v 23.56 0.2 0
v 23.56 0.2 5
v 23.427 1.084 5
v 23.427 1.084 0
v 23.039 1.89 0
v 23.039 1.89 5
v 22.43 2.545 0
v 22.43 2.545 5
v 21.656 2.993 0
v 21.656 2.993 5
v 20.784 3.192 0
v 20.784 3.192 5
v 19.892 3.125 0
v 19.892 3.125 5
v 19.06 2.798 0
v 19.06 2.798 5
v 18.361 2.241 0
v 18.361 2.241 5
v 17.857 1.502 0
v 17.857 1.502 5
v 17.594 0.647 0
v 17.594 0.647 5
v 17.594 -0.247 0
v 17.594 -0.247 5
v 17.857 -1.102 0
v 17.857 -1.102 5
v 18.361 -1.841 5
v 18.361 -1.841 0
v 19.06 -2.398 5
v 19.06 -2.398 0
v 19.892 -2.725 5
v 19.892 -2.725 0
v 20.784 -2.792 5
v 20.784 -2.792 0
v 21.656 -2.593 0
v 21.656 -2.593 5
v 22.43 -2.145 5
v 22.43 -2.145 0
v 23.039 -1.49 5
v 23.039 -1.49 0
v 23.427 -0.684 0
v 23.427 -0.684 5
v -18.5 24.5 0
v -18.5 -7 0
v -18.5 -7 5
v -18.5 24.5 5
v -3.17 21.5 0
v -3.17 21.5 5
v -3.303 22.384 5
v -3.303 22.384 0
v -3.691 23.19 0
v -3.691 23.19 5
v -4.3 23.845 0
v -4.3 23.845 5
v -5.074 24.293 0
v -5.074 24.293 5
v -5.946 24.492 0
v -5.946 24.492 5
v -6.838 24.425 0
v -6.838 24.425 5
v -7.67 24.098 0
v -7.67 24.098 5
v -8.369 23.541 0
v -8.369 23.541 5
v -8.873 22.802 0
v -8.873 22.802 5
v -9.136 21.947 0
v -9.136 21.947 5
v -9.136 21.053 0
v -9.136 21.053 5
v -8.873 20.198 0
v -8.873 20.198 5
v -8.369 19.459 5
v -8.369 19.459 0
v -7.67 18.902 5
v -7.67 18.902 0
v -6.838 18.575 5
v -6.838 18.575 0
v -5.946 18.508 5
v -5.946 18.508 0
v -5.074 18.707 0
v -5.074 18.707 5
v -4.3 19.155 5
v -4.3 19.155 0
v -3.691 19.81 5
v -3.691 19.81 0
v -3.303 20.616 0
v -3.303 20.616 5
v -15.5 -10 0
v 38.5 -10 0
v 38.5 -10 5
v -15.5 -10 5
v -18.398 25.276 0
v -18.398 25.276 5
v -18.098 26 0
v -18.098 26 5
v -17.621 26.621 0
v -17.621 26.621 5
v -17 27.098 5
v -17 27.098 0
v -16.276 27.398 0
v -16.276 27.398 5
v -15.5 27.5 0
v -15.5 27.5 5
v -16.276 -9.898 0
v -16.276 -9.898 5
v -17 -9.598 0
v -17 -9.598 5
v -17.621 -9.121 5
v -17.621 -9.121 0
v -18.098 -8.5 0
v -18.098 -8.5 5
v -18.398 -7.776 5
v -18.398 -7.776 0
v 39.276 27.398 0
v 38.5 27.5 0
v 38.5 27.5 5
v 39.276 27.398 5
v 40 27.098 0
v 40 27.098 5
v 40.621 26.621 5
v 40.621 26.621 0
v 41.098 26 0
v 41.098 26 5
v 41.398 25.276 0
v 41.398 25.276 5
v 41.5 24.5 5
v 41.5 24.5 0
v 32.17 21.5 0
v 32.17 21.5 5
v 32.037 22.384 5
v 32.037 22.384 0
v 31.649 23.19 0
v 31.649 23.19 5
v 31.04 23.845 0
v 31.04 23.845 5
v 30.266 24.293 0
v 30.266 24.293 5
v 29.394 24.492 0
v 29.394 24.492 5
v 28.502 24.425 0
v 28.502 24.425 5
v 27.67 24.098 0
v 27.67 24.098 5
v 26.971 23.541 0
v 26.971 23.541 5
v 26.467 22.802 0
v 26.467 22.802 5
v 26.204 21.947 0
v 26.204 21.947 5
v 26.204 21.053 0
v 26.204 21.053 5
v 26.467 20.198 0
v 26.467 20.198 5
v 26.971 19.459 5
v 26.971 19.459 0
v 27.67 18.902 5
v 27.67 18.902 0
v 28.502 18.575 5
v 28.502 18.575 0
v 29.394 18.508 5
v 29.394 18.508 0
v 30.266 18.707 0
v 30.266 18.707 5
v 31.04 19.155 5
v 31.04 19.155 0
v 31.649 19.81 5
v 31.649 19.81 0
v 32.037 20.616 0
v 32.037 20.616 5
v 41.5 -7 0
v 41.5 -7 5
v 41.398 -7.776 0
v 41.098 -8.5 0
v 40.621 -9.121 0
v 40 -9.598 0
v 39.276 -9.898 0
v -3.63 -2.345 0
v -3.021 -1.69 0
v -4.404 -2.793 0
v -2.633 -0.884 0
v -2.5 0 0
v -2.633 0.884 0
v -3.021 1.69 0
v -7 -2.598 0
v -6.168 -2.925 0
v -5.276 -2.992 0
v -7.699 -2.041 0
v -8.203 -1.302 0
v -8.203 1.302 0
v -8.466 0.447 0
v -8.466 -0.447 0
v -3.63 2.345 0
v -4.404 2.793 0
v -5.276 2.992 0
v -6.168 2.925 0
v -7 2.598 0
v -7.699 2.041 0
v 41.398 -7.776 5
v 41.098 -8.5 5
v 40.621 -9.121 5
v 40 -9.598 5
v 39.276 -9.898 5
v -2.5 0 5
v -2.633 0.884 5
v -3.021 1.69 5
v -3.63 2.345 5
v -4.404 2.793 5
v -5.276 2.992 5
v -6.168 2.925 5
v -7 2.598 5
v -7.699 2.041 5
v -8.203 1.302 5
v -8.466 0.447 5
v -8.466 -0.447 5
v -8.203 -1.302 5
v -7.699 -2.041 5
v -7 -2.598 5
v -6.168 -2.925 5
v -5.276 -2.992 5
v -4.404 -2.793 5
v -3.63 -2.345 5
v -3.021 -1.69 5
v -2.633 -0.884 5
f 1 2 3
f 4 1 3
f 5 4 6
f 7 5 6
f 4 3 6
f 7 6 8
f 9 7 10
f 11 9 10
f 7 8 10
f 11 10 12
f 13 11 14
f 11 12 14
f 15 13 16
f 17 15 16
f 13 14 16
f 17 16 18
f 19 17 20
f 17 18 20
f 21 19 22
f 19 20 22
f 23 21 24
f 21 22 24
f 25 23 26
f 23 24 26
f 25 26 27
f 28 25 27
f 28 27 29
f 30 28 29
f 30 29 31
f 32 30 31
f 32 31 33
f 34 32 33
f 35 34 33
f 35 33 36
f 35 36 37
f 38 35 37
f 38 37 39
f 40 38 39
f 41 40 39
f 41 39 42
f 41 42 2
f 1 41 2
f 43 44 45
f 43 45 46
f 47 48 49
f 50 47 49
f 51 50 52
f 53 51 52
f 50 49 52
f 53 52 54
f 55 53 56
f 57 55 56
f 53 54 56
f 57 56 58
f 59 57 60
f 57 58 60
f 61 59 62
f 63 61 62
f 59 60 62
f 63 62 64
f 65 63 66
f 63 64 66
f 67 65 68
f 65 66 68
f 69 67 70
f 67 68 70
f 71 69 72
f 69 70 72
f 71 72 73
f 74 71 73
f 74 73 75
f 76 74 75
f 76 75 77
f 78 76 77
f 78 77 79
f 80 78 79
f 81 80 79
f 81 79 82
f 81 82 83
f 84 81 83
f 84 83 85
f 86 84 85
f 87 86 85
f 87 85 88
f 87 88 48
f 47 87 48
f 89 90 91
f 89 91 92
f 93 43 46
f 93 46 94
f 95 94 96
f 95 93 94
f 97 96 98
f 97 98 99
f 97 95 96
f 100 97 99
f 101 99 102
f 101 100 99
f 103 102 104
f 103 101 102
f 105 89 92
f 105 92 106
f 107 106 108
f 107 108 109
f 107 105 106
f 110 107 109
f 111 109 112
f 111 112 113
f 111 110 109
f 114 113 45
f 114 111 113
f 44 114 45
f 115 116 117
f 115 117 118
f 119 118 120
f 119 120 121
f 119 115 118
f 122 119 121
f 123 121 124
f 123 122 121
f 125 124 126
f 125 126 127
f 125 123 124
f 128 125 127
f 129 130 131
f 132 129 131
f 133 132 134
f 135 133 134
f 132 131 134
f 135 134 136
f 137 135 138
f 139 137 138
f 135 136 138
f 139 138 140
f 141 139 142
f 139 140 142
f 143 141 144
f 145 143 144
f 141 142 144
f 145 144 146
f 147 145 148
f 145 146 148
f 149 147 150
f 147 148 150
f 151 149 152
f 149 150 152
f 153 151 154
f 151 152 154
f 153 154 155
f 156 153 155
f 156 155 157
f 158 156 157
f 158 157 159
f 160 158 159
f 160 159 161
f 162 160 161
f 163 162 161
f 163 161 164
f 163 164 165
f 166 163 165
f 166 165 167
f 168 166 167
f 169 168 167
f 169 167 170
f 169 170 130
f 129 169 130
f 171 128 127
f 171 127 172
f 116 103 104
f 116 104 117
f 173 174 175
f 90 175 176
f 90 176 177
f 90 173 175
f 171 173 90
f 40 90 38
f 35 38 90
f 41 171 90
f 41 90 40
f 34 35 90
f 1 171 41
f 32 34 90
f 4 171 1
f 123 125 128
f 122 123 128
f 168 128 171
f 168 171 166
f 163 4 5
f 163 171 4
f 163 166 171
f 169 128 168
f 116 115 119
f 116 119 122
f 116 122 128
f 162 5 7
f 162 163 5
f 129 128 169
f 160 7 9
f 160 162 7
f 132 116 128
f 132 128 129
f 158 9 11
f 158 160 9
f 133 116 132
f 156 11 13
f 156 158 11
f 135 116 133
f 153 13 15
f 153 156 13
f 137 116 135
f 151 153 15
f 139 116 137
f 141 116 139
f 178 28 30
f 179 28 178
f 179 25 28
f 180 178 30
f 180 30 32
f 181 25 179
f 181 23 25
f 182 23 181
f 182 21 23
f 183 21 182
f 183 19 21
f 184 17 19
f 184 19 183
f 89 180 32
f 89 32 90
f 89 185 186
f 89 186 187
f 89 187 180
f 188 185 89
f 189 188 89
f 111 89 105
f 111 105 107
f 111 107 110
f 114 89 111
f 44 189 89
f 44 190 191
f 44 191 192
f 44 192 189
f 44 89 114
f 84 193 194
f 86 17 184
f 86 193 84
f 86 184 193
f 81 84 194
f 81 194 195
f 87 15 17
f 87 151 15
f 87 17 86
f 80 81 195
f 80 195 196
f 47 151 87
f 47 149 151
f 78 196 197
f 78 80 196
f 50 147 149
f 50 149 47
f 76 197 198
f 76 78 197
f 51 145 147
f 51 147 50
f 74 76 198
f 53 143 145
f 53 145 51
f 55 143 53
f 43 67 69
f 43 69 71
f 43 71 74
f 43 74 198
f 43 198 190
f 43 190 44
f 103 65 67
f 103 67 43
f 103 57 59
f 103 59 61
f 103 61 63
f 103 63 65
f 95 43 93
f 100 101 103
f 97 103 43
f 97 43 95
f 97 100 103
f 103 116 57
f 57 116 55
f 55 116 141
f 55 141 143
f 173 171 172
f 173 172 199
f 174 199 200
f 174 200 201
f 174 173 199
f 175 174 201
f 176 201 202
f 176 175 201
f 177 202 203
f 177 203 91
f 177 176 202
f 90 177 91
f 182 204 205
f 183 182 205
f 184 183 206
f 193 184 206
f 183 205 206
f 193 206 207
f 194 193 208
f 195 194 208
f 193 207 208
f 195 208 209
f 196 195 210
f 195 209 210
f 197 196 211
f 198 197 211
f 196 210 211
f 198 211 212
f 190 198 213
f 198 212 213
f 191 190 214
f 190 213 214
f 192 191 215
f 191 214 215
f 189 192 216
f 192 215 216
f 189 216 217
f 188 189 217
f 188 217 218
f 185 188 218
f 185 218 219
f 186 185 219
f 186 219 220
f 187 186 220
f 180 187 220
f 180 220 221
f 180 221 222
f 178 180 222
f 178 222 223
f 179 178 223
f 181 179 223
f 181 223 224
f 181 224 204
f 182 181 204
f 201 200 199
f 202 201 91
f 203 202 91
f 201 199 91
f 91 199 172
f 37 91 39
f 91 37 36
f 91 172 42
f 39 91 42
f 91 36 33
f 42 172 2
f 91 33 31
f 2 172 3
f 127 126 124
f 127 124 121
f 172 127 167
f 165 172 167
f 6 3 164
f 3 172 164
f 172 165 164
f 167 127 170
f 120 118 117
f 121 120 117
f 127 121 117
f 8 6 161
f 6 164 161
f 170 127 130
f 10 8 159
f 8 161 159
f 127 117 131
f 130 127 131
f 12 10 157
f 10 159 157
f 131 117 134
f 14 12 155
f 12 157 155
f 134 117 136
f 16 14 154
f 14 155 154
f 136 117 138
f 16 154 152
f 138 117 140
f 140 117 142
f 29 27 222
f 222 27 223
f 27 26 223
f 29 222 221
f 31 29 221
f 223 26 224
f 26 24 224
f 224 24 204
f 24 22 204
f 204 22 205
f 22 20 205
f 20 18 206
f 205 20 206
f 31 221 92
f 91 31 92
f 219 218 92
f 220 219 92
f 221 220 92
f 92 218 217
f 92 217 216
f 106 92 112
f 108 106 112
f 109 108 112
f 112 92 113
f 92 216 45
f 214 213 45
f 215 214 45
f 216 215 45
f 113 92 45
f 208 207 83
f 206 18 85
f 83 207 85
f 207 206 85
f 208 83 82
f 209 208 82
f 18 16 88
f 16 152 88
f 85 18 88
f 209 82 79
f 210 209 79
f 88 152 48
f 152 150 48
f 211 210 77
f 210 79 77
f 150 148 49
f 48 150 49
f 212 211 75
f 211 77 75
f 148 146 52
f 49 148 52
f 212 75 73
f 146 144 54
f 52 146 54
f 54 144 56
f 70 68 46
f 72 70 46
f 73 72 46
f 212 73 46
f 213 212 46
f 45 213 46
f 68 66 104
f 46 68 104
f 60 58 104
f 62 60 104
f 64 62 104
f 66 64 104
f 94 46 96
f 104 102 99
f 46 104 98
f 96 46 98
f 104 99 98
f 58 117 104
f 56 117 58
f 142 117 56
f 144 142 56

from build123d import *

# Parameters (mm, degrees)
EXTRUDE_1_DEPTH     = 5
SKETCH_2_R          = 3
CUT_EXTRUDE_1_DEPTH = 10
SKETCH_4_R          = 3
CUT_EXTRUDE_2_DEPTH = 10
SKETCH_9_R          = 3
CUT_EXTRUDE_3_DEPTH = 10


with BuildPart() as part:
    # 草图1 → 凸台-拉伸1 (new body)
    with BuildSketch(Plane.XY):
        with BuildLine():
            Line((-15.5, 27.5), (38.5, 27.5))
            ThreePointArc((38.5, 27.5), (40.621320344, 26.621320344), (41.5, 24.5))
            Line((41.5, 24.5), (41.5, -7))
            ThreePointArc((41.5, -7), (40.621320344, -9.121320344), (38.5, -10))
            Line((38.5, -10), (33.3, -10))
            Line((33.3, -10), (31.175, -10))
            Line((31.175, -10), (-8.825, -10))
            Line((-8.825, -10), (-15.5, -10))
            ThreePointArc((-15.5, -10), (-17.621320344, -9.121320344), (-18.5, -7))
            Line((-18.5, -7), (-18.5, 24.5))
            ThreePointArc((-18.5, 24.5), (-17.621320344, 26.621320344), (-15.5, 27.5))
        make_face()
    extrude(amount=EXTRUDE_1_DEPTH)

    # 草图2 → 切除-拉伸1 (cut)
    with BuildSketch(Plane.XY.offset(5)):
        with Locations((-6.17, 21.5)):
            Circle(SKETCH_2_R)
        with Locations((29.17, 21.5)):
            Circle(SKETCH_2_R)
    extrude(amount=-CUT_EXTRUDE_1_DEPTH, mode=Mode.SUBTRACT)

    # 草图4 → 切除-拉伸2 (cut)
    with BuildSketch(Plane.XY.offset(5)):
        with Locations((-5.5, 0)):
            Circle(SKETCH_4_R)
    extrude(amount=-CUT_EXTRUDE_2_DEPTH, mode=Mode.SUBTRACT)

    # 草图9 → 切除-拉伸3 (cut)
    with BuildSketch(Plane.XY.offset(5)):
        with Locations((20.56, 0.2)):
            Circle(SKETCH_9_R)
    extrude(amount=-CUT_EXTRUDE_3_DEPTH, mode=Mode.SUBTRACT)


solid = part.part
